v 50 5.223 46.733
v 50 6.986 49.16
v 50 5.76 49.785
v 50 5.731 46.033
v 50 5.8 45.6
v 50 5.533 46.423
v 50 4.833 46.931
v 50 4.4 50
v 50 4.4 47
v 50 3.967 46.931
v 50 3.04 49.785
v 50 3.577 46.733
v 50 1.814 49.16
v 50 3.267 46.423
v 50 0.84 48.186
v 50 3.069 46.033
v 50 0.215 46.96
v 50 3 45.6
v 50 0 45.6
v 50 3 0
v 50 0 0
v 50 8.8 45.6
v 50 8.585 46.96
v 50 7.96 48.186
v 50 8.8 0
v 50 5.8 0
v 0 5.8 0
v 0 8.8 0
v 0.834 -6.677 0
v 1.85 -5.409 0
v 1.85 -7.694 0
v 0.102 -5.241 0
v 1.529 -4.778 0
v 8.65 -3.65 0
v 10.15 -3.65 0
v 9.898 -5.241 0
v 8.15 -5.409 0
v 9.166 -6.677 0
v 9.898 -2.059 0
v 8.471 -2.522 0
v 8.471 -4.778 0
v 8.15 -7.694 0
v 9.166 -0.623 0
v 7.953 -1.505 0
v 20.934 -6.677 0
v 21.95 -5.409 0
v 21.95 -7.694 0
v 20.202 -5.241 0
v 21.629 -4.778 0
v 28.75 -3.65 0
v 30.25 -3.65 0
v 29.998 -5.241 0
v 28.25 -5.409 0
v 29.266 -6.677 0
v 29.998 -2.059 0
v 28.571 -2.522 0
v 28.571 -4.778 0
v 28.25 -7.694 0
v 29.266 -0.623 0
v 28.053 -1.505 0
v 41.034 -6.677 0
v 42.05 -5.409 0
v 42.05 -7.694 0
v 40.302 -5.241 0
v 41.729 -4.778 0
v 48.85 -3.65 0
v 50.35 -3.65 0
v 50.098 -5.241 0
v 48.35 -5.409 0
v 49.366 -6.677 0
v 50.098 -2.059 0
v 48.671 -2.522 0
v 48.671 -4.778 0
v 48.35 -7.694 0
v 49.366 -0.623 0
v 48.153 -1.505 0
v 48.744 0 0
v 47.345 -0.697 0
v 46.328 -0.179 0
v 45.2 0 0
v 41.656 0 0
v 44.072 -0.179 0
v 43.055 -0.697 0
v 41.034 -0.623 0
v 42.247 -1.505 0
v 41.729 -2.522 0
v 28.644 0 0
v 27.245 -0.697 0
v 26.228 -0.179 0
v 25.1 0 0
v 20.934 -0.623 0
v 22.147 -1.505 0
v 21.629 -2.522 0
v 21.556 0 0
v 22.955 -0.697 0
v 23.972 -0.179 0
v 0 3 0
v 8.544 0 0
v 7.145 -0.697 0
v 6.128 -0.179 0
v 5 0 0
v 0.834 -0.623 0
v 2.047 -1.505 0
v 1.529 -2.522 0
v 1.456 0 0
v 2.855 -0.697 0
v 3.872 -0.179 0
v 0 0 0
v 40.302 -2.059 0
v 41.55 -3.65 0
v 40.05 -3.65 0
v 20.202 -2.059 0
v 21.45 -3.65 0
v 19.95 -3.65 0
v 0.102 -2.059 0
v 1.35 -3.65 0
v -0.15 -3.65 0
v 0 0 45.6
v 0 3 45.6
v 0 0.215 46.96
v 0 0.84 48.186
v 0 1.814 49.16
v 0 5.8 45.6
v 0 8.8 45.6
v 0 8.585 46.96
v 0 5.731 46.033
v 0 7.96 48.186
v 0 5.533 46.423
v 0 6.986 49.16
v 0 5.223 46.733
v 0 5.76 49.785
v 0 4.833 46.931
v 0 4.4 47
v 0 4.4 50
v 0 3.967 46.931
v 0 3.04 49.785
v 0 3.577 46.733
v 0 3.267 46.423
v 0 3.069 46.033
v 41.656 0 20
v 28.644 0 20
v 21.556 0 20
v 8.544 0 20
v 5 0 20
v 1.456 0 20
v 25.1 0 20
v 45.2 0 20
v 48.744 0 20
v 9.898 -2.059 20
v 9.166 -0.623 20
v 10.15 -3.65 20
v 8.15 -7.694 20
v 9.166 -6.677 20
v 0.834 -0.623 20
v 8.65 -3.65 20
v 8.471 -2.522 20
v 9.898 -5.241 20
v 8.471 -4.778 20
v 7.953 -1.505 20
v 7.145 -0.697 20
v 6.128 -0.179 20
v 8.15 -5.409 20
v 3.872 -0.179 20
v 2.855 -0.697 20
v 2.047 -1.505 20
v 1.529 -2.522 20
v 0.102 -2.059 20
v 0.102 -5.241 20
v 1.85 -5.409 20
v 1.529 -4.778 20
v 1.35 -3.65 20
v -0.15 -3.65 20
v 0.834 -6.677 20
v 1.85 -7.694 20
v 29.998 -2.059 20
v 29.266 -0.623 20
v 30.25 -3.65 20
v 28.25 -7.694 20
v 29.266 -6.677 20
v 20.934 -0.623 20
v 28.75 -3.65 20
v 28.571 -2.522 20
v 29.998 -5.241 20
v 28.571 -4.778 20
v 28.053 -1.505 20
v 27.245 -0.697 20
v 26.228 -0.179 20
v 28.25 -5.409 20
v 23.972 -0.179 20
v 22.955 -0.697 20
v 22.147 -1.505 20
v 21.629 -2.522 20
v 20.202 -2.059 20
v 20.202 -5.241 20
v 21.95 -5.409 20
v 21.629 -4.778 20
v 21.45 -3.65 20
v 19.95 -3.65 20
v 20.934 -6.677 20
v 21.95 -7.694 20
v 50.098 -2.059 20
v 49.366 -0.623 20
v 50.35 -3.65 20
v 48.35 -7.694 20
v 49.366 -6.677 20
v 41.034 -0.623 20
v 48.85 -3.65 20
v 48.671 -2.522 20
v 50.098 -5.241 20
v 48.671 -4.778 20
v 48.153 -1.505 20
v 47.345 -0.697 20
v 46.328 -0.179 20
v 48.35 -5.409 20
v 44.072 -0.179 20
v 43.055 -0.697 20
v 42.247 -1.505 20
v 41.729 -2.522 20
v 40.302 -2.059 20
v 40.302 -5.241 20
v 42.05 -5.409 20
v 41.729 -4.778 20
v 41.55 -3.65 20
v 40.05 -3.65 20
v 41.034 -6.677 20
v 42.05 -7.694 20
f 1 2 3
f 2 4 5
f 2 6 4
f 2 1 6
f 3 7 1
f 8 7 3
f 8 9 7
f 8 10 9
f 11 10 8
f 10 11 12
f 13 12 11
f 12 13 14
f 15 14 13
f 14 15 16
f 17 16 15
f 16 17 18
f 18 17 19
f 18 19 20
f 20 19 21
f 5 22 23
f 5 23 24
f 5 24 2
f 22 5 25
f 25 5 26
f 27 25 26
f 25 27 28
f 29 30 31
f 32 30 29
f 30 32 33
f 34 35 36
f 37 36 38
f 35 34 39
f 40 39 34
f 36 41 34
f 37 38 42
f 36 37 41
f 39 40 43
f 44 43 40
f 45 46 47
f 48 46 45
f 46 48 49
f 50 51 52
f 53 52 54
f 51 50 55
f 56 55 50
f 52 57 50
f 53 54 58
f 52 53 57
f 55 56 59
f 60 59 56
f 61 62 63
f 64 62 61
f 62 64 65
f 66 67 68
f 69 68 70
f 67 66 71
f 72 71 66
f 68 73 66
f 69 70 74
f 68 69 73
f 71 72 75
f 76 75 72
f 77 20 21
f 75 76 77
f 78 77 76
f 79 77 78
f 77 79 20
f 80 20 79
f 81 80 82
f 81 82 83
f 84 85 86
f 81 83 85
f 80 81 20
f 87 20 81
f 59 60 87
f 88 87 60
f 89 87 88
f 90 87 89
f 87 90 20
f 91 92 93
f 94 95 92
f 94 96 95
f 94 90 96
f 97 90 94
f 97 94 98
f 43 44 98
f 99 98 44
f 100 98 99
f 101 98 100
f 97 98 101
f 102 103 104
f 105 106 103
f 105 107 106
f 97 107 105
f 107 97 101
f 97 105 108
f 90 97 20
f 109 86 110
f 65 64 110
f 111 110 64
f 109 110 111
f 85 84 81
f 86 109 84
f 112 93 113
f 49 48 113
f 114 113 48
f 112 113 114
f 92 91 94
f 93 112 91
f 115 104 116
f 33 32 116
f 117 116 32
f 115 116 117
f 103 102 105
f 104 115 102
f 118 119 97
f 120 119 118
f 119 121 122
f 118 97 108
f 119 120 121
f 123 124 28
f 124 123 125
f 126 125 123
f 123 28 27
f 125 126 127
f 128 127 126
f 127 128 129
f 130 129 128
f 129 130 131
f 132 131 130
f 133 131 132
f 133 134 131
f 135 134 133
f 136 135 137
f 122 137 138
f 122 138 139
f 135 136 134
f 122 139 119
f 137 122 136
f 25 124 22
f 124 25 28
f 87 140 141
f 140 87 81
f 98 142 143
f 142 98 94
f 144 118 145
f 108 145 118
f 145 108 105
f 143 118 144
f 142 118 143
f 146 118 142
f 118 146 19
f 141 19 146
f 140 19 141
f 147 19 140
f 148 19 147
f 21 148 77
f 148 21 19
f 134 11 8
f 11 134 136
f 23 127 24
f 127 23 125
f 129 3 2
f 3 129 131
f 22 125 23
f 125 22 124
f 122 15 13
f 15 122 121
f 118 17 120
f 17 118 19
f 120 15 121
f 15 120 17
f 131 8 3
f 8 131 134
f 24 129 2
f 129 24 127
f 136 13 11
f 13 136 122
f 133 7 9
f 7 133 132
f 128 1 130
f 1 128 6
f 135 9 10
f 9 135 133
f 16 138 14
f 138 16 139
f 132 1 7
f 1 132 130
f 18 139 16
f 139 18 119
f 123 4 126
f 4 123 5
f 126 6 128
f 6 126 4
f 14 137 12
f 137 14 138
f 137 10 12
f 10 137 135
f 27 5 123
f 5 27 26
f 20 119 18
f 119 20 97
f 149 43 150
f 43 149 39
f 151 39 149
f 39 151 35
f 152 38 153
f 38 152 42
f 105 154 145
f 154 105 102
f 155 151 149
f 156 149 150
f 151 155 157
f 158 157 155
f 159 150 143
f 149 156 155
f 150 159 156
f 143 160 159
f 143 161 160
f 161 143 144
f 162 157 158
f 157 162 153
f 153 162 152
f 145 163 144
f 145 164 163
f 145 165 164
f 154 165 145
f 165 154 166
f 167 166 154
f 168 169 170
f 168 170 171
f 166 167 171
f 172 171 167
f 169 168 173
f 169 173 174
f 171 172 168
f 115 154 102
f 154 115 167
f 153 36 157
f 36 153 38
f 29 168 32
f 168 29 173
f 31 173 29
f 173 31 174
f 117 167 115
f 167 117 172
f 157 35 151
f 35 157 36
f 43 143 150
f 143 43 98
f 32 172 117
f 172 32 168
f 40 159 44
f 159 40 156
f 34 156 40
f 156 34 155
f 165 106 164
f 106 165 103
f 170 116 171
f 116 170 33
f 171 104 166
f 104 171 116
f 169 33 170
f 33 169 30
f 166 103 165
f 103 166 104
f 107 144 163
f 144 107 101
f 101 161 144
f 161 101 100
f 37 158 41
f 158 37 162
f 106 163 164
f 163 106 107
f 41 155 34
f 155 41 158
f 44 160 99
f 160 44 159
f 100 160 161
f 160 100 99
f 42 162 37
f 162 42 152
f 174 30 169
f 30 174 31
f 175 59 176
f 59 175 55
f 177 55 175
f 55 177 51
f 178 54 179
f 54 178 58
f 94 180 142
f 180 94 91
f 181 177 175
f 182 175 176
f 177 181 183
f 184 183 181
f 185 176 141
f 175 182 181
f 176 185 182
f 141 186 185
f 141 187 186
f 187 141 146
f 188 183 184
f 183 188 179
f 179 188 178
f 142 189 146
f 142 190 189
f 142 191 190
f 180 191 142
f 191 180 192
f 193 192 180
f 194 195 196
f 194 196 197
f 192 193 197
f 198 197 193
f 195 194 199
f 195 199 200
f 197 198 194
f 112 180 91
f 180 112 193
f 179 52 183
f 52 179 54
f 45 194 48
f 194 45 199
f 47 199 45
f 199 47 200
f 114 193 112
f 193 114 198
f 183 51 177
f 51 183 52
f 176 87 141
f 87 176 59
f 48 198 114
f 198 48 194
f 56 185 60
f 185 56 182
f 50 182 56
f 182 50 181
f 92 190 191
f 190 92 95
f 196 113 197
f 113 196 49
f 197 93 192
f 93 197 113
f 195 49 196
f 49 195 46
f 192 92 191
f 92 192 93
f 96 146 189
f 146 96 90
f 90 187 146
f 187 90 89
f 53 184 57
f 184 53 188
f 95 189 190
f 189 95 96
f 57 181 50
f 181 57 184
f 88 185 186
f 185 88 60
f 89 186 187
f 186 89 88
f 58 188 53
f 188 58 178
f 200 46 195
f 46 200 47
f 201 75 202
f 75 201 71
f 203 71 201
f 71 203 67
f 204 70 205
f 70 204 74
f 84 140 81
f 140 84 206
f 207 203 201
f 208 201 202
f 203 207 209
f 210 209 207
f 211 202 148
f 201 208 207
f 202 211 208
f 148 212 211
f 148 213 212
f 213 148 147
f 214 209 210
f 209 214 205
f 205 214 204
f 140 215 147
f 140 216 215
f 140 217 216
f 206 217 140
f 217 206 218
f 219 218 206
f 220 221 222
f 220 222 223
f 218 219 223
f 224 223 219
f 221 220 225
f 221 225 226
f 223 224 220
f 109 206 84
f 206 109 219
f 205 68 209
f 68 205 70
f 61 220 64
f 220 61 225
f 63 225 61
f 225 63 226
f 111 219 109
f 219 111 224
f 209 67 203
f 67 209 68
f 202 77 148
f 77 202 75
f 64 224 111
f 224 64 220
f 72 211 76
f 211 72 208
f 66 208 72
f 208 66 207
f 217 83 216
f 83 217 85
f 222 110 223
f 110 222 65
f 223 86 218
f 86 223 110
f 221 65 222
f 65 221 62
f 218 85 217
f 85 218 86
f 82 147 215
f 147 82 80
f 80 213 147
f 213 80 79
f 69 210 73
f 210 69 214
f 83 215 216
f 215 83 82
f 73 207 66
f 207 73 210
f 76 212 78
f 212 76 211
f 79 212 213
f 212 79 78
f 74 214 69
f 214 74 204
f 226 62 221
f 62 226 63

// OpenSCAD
// [FL_INDEX: keywords="openscad, 3d_parametric, Pencil_clip_for_3_ring_binder, csg_solid" | COT="Parametric OpenSCAD design from 3DCodeverse"]
// Title: Pencil clip for 3 ring binder

$fn = 20;
height = 50; //the total height of the object.
width = 50; //the width of the clip.
thickness = 3; //clip thickness.
binder_thickness = 2.8; //measured width of your own binder.
pencil_diameter = 7.3; //measured width of your own pencils.
clip_number = 3;

top_arc_diameter = (2*thickness)+binder_thickness;
inset = 5;
clip_gap = pencil_diameter-1;


//Entire Object
union(){

 //Clip - gap inside clip for binder - inner arch
 difference(){
  
  //Main binder clip structure + top arch
  union(){
   
   //Main binder clip structure 
   cube([width, (thickness*2)+binder_thickness, height-(top_arc_diameter/2)]);
   
   //Top arch of binder clip
   rotate([90, 90, 90]){
    translate([-height+(top_arc_diameter/2), top_arc_diameter/2, 0]){
     cylinder(width, top_arc_diameter/2, top_arc_diameter/2);
    }
   }
  }

  //Rounding out the inside of the binder clip
  rotate([90, 90, 90]){
   translate([-height+(top_arc_diameter/2), top_arc_diameter/2, 0]){
    cylinder(width, binder_thickness/2, binder_thickness/2);
   }
  }

  //The gap inside the binder clip
  translate([-0.5, (10-4)/2, 0]){
   cube([width+1, binder_thickness, height-top_arc_diameter/2]);
  }
 }

 //Pencil clip(s)
 for (i = [0 : clip_number-1]){
  translate([(((width+pencil_diameter+thickness)/clip_number)*i),0,0]){
   difference(){
    translate([inset, -pencil_diameter/2, 0]){
     cylinder(20, (pencil_diameter/2)+(thickness/2), (pencil_diameter/2)+(thickness/2));
    }
    translate([inset, -pencil_diameter/2, 0]){
     cylinder(20, (pencil_diameter/2), (pencil_diameter/2));
    }
    translate([inset-clip_gap/2, -(pencil_diameter+thickness), 0]){
     cube([clip_gap, 5, 20]);
    }
   }
  }
 }
}
